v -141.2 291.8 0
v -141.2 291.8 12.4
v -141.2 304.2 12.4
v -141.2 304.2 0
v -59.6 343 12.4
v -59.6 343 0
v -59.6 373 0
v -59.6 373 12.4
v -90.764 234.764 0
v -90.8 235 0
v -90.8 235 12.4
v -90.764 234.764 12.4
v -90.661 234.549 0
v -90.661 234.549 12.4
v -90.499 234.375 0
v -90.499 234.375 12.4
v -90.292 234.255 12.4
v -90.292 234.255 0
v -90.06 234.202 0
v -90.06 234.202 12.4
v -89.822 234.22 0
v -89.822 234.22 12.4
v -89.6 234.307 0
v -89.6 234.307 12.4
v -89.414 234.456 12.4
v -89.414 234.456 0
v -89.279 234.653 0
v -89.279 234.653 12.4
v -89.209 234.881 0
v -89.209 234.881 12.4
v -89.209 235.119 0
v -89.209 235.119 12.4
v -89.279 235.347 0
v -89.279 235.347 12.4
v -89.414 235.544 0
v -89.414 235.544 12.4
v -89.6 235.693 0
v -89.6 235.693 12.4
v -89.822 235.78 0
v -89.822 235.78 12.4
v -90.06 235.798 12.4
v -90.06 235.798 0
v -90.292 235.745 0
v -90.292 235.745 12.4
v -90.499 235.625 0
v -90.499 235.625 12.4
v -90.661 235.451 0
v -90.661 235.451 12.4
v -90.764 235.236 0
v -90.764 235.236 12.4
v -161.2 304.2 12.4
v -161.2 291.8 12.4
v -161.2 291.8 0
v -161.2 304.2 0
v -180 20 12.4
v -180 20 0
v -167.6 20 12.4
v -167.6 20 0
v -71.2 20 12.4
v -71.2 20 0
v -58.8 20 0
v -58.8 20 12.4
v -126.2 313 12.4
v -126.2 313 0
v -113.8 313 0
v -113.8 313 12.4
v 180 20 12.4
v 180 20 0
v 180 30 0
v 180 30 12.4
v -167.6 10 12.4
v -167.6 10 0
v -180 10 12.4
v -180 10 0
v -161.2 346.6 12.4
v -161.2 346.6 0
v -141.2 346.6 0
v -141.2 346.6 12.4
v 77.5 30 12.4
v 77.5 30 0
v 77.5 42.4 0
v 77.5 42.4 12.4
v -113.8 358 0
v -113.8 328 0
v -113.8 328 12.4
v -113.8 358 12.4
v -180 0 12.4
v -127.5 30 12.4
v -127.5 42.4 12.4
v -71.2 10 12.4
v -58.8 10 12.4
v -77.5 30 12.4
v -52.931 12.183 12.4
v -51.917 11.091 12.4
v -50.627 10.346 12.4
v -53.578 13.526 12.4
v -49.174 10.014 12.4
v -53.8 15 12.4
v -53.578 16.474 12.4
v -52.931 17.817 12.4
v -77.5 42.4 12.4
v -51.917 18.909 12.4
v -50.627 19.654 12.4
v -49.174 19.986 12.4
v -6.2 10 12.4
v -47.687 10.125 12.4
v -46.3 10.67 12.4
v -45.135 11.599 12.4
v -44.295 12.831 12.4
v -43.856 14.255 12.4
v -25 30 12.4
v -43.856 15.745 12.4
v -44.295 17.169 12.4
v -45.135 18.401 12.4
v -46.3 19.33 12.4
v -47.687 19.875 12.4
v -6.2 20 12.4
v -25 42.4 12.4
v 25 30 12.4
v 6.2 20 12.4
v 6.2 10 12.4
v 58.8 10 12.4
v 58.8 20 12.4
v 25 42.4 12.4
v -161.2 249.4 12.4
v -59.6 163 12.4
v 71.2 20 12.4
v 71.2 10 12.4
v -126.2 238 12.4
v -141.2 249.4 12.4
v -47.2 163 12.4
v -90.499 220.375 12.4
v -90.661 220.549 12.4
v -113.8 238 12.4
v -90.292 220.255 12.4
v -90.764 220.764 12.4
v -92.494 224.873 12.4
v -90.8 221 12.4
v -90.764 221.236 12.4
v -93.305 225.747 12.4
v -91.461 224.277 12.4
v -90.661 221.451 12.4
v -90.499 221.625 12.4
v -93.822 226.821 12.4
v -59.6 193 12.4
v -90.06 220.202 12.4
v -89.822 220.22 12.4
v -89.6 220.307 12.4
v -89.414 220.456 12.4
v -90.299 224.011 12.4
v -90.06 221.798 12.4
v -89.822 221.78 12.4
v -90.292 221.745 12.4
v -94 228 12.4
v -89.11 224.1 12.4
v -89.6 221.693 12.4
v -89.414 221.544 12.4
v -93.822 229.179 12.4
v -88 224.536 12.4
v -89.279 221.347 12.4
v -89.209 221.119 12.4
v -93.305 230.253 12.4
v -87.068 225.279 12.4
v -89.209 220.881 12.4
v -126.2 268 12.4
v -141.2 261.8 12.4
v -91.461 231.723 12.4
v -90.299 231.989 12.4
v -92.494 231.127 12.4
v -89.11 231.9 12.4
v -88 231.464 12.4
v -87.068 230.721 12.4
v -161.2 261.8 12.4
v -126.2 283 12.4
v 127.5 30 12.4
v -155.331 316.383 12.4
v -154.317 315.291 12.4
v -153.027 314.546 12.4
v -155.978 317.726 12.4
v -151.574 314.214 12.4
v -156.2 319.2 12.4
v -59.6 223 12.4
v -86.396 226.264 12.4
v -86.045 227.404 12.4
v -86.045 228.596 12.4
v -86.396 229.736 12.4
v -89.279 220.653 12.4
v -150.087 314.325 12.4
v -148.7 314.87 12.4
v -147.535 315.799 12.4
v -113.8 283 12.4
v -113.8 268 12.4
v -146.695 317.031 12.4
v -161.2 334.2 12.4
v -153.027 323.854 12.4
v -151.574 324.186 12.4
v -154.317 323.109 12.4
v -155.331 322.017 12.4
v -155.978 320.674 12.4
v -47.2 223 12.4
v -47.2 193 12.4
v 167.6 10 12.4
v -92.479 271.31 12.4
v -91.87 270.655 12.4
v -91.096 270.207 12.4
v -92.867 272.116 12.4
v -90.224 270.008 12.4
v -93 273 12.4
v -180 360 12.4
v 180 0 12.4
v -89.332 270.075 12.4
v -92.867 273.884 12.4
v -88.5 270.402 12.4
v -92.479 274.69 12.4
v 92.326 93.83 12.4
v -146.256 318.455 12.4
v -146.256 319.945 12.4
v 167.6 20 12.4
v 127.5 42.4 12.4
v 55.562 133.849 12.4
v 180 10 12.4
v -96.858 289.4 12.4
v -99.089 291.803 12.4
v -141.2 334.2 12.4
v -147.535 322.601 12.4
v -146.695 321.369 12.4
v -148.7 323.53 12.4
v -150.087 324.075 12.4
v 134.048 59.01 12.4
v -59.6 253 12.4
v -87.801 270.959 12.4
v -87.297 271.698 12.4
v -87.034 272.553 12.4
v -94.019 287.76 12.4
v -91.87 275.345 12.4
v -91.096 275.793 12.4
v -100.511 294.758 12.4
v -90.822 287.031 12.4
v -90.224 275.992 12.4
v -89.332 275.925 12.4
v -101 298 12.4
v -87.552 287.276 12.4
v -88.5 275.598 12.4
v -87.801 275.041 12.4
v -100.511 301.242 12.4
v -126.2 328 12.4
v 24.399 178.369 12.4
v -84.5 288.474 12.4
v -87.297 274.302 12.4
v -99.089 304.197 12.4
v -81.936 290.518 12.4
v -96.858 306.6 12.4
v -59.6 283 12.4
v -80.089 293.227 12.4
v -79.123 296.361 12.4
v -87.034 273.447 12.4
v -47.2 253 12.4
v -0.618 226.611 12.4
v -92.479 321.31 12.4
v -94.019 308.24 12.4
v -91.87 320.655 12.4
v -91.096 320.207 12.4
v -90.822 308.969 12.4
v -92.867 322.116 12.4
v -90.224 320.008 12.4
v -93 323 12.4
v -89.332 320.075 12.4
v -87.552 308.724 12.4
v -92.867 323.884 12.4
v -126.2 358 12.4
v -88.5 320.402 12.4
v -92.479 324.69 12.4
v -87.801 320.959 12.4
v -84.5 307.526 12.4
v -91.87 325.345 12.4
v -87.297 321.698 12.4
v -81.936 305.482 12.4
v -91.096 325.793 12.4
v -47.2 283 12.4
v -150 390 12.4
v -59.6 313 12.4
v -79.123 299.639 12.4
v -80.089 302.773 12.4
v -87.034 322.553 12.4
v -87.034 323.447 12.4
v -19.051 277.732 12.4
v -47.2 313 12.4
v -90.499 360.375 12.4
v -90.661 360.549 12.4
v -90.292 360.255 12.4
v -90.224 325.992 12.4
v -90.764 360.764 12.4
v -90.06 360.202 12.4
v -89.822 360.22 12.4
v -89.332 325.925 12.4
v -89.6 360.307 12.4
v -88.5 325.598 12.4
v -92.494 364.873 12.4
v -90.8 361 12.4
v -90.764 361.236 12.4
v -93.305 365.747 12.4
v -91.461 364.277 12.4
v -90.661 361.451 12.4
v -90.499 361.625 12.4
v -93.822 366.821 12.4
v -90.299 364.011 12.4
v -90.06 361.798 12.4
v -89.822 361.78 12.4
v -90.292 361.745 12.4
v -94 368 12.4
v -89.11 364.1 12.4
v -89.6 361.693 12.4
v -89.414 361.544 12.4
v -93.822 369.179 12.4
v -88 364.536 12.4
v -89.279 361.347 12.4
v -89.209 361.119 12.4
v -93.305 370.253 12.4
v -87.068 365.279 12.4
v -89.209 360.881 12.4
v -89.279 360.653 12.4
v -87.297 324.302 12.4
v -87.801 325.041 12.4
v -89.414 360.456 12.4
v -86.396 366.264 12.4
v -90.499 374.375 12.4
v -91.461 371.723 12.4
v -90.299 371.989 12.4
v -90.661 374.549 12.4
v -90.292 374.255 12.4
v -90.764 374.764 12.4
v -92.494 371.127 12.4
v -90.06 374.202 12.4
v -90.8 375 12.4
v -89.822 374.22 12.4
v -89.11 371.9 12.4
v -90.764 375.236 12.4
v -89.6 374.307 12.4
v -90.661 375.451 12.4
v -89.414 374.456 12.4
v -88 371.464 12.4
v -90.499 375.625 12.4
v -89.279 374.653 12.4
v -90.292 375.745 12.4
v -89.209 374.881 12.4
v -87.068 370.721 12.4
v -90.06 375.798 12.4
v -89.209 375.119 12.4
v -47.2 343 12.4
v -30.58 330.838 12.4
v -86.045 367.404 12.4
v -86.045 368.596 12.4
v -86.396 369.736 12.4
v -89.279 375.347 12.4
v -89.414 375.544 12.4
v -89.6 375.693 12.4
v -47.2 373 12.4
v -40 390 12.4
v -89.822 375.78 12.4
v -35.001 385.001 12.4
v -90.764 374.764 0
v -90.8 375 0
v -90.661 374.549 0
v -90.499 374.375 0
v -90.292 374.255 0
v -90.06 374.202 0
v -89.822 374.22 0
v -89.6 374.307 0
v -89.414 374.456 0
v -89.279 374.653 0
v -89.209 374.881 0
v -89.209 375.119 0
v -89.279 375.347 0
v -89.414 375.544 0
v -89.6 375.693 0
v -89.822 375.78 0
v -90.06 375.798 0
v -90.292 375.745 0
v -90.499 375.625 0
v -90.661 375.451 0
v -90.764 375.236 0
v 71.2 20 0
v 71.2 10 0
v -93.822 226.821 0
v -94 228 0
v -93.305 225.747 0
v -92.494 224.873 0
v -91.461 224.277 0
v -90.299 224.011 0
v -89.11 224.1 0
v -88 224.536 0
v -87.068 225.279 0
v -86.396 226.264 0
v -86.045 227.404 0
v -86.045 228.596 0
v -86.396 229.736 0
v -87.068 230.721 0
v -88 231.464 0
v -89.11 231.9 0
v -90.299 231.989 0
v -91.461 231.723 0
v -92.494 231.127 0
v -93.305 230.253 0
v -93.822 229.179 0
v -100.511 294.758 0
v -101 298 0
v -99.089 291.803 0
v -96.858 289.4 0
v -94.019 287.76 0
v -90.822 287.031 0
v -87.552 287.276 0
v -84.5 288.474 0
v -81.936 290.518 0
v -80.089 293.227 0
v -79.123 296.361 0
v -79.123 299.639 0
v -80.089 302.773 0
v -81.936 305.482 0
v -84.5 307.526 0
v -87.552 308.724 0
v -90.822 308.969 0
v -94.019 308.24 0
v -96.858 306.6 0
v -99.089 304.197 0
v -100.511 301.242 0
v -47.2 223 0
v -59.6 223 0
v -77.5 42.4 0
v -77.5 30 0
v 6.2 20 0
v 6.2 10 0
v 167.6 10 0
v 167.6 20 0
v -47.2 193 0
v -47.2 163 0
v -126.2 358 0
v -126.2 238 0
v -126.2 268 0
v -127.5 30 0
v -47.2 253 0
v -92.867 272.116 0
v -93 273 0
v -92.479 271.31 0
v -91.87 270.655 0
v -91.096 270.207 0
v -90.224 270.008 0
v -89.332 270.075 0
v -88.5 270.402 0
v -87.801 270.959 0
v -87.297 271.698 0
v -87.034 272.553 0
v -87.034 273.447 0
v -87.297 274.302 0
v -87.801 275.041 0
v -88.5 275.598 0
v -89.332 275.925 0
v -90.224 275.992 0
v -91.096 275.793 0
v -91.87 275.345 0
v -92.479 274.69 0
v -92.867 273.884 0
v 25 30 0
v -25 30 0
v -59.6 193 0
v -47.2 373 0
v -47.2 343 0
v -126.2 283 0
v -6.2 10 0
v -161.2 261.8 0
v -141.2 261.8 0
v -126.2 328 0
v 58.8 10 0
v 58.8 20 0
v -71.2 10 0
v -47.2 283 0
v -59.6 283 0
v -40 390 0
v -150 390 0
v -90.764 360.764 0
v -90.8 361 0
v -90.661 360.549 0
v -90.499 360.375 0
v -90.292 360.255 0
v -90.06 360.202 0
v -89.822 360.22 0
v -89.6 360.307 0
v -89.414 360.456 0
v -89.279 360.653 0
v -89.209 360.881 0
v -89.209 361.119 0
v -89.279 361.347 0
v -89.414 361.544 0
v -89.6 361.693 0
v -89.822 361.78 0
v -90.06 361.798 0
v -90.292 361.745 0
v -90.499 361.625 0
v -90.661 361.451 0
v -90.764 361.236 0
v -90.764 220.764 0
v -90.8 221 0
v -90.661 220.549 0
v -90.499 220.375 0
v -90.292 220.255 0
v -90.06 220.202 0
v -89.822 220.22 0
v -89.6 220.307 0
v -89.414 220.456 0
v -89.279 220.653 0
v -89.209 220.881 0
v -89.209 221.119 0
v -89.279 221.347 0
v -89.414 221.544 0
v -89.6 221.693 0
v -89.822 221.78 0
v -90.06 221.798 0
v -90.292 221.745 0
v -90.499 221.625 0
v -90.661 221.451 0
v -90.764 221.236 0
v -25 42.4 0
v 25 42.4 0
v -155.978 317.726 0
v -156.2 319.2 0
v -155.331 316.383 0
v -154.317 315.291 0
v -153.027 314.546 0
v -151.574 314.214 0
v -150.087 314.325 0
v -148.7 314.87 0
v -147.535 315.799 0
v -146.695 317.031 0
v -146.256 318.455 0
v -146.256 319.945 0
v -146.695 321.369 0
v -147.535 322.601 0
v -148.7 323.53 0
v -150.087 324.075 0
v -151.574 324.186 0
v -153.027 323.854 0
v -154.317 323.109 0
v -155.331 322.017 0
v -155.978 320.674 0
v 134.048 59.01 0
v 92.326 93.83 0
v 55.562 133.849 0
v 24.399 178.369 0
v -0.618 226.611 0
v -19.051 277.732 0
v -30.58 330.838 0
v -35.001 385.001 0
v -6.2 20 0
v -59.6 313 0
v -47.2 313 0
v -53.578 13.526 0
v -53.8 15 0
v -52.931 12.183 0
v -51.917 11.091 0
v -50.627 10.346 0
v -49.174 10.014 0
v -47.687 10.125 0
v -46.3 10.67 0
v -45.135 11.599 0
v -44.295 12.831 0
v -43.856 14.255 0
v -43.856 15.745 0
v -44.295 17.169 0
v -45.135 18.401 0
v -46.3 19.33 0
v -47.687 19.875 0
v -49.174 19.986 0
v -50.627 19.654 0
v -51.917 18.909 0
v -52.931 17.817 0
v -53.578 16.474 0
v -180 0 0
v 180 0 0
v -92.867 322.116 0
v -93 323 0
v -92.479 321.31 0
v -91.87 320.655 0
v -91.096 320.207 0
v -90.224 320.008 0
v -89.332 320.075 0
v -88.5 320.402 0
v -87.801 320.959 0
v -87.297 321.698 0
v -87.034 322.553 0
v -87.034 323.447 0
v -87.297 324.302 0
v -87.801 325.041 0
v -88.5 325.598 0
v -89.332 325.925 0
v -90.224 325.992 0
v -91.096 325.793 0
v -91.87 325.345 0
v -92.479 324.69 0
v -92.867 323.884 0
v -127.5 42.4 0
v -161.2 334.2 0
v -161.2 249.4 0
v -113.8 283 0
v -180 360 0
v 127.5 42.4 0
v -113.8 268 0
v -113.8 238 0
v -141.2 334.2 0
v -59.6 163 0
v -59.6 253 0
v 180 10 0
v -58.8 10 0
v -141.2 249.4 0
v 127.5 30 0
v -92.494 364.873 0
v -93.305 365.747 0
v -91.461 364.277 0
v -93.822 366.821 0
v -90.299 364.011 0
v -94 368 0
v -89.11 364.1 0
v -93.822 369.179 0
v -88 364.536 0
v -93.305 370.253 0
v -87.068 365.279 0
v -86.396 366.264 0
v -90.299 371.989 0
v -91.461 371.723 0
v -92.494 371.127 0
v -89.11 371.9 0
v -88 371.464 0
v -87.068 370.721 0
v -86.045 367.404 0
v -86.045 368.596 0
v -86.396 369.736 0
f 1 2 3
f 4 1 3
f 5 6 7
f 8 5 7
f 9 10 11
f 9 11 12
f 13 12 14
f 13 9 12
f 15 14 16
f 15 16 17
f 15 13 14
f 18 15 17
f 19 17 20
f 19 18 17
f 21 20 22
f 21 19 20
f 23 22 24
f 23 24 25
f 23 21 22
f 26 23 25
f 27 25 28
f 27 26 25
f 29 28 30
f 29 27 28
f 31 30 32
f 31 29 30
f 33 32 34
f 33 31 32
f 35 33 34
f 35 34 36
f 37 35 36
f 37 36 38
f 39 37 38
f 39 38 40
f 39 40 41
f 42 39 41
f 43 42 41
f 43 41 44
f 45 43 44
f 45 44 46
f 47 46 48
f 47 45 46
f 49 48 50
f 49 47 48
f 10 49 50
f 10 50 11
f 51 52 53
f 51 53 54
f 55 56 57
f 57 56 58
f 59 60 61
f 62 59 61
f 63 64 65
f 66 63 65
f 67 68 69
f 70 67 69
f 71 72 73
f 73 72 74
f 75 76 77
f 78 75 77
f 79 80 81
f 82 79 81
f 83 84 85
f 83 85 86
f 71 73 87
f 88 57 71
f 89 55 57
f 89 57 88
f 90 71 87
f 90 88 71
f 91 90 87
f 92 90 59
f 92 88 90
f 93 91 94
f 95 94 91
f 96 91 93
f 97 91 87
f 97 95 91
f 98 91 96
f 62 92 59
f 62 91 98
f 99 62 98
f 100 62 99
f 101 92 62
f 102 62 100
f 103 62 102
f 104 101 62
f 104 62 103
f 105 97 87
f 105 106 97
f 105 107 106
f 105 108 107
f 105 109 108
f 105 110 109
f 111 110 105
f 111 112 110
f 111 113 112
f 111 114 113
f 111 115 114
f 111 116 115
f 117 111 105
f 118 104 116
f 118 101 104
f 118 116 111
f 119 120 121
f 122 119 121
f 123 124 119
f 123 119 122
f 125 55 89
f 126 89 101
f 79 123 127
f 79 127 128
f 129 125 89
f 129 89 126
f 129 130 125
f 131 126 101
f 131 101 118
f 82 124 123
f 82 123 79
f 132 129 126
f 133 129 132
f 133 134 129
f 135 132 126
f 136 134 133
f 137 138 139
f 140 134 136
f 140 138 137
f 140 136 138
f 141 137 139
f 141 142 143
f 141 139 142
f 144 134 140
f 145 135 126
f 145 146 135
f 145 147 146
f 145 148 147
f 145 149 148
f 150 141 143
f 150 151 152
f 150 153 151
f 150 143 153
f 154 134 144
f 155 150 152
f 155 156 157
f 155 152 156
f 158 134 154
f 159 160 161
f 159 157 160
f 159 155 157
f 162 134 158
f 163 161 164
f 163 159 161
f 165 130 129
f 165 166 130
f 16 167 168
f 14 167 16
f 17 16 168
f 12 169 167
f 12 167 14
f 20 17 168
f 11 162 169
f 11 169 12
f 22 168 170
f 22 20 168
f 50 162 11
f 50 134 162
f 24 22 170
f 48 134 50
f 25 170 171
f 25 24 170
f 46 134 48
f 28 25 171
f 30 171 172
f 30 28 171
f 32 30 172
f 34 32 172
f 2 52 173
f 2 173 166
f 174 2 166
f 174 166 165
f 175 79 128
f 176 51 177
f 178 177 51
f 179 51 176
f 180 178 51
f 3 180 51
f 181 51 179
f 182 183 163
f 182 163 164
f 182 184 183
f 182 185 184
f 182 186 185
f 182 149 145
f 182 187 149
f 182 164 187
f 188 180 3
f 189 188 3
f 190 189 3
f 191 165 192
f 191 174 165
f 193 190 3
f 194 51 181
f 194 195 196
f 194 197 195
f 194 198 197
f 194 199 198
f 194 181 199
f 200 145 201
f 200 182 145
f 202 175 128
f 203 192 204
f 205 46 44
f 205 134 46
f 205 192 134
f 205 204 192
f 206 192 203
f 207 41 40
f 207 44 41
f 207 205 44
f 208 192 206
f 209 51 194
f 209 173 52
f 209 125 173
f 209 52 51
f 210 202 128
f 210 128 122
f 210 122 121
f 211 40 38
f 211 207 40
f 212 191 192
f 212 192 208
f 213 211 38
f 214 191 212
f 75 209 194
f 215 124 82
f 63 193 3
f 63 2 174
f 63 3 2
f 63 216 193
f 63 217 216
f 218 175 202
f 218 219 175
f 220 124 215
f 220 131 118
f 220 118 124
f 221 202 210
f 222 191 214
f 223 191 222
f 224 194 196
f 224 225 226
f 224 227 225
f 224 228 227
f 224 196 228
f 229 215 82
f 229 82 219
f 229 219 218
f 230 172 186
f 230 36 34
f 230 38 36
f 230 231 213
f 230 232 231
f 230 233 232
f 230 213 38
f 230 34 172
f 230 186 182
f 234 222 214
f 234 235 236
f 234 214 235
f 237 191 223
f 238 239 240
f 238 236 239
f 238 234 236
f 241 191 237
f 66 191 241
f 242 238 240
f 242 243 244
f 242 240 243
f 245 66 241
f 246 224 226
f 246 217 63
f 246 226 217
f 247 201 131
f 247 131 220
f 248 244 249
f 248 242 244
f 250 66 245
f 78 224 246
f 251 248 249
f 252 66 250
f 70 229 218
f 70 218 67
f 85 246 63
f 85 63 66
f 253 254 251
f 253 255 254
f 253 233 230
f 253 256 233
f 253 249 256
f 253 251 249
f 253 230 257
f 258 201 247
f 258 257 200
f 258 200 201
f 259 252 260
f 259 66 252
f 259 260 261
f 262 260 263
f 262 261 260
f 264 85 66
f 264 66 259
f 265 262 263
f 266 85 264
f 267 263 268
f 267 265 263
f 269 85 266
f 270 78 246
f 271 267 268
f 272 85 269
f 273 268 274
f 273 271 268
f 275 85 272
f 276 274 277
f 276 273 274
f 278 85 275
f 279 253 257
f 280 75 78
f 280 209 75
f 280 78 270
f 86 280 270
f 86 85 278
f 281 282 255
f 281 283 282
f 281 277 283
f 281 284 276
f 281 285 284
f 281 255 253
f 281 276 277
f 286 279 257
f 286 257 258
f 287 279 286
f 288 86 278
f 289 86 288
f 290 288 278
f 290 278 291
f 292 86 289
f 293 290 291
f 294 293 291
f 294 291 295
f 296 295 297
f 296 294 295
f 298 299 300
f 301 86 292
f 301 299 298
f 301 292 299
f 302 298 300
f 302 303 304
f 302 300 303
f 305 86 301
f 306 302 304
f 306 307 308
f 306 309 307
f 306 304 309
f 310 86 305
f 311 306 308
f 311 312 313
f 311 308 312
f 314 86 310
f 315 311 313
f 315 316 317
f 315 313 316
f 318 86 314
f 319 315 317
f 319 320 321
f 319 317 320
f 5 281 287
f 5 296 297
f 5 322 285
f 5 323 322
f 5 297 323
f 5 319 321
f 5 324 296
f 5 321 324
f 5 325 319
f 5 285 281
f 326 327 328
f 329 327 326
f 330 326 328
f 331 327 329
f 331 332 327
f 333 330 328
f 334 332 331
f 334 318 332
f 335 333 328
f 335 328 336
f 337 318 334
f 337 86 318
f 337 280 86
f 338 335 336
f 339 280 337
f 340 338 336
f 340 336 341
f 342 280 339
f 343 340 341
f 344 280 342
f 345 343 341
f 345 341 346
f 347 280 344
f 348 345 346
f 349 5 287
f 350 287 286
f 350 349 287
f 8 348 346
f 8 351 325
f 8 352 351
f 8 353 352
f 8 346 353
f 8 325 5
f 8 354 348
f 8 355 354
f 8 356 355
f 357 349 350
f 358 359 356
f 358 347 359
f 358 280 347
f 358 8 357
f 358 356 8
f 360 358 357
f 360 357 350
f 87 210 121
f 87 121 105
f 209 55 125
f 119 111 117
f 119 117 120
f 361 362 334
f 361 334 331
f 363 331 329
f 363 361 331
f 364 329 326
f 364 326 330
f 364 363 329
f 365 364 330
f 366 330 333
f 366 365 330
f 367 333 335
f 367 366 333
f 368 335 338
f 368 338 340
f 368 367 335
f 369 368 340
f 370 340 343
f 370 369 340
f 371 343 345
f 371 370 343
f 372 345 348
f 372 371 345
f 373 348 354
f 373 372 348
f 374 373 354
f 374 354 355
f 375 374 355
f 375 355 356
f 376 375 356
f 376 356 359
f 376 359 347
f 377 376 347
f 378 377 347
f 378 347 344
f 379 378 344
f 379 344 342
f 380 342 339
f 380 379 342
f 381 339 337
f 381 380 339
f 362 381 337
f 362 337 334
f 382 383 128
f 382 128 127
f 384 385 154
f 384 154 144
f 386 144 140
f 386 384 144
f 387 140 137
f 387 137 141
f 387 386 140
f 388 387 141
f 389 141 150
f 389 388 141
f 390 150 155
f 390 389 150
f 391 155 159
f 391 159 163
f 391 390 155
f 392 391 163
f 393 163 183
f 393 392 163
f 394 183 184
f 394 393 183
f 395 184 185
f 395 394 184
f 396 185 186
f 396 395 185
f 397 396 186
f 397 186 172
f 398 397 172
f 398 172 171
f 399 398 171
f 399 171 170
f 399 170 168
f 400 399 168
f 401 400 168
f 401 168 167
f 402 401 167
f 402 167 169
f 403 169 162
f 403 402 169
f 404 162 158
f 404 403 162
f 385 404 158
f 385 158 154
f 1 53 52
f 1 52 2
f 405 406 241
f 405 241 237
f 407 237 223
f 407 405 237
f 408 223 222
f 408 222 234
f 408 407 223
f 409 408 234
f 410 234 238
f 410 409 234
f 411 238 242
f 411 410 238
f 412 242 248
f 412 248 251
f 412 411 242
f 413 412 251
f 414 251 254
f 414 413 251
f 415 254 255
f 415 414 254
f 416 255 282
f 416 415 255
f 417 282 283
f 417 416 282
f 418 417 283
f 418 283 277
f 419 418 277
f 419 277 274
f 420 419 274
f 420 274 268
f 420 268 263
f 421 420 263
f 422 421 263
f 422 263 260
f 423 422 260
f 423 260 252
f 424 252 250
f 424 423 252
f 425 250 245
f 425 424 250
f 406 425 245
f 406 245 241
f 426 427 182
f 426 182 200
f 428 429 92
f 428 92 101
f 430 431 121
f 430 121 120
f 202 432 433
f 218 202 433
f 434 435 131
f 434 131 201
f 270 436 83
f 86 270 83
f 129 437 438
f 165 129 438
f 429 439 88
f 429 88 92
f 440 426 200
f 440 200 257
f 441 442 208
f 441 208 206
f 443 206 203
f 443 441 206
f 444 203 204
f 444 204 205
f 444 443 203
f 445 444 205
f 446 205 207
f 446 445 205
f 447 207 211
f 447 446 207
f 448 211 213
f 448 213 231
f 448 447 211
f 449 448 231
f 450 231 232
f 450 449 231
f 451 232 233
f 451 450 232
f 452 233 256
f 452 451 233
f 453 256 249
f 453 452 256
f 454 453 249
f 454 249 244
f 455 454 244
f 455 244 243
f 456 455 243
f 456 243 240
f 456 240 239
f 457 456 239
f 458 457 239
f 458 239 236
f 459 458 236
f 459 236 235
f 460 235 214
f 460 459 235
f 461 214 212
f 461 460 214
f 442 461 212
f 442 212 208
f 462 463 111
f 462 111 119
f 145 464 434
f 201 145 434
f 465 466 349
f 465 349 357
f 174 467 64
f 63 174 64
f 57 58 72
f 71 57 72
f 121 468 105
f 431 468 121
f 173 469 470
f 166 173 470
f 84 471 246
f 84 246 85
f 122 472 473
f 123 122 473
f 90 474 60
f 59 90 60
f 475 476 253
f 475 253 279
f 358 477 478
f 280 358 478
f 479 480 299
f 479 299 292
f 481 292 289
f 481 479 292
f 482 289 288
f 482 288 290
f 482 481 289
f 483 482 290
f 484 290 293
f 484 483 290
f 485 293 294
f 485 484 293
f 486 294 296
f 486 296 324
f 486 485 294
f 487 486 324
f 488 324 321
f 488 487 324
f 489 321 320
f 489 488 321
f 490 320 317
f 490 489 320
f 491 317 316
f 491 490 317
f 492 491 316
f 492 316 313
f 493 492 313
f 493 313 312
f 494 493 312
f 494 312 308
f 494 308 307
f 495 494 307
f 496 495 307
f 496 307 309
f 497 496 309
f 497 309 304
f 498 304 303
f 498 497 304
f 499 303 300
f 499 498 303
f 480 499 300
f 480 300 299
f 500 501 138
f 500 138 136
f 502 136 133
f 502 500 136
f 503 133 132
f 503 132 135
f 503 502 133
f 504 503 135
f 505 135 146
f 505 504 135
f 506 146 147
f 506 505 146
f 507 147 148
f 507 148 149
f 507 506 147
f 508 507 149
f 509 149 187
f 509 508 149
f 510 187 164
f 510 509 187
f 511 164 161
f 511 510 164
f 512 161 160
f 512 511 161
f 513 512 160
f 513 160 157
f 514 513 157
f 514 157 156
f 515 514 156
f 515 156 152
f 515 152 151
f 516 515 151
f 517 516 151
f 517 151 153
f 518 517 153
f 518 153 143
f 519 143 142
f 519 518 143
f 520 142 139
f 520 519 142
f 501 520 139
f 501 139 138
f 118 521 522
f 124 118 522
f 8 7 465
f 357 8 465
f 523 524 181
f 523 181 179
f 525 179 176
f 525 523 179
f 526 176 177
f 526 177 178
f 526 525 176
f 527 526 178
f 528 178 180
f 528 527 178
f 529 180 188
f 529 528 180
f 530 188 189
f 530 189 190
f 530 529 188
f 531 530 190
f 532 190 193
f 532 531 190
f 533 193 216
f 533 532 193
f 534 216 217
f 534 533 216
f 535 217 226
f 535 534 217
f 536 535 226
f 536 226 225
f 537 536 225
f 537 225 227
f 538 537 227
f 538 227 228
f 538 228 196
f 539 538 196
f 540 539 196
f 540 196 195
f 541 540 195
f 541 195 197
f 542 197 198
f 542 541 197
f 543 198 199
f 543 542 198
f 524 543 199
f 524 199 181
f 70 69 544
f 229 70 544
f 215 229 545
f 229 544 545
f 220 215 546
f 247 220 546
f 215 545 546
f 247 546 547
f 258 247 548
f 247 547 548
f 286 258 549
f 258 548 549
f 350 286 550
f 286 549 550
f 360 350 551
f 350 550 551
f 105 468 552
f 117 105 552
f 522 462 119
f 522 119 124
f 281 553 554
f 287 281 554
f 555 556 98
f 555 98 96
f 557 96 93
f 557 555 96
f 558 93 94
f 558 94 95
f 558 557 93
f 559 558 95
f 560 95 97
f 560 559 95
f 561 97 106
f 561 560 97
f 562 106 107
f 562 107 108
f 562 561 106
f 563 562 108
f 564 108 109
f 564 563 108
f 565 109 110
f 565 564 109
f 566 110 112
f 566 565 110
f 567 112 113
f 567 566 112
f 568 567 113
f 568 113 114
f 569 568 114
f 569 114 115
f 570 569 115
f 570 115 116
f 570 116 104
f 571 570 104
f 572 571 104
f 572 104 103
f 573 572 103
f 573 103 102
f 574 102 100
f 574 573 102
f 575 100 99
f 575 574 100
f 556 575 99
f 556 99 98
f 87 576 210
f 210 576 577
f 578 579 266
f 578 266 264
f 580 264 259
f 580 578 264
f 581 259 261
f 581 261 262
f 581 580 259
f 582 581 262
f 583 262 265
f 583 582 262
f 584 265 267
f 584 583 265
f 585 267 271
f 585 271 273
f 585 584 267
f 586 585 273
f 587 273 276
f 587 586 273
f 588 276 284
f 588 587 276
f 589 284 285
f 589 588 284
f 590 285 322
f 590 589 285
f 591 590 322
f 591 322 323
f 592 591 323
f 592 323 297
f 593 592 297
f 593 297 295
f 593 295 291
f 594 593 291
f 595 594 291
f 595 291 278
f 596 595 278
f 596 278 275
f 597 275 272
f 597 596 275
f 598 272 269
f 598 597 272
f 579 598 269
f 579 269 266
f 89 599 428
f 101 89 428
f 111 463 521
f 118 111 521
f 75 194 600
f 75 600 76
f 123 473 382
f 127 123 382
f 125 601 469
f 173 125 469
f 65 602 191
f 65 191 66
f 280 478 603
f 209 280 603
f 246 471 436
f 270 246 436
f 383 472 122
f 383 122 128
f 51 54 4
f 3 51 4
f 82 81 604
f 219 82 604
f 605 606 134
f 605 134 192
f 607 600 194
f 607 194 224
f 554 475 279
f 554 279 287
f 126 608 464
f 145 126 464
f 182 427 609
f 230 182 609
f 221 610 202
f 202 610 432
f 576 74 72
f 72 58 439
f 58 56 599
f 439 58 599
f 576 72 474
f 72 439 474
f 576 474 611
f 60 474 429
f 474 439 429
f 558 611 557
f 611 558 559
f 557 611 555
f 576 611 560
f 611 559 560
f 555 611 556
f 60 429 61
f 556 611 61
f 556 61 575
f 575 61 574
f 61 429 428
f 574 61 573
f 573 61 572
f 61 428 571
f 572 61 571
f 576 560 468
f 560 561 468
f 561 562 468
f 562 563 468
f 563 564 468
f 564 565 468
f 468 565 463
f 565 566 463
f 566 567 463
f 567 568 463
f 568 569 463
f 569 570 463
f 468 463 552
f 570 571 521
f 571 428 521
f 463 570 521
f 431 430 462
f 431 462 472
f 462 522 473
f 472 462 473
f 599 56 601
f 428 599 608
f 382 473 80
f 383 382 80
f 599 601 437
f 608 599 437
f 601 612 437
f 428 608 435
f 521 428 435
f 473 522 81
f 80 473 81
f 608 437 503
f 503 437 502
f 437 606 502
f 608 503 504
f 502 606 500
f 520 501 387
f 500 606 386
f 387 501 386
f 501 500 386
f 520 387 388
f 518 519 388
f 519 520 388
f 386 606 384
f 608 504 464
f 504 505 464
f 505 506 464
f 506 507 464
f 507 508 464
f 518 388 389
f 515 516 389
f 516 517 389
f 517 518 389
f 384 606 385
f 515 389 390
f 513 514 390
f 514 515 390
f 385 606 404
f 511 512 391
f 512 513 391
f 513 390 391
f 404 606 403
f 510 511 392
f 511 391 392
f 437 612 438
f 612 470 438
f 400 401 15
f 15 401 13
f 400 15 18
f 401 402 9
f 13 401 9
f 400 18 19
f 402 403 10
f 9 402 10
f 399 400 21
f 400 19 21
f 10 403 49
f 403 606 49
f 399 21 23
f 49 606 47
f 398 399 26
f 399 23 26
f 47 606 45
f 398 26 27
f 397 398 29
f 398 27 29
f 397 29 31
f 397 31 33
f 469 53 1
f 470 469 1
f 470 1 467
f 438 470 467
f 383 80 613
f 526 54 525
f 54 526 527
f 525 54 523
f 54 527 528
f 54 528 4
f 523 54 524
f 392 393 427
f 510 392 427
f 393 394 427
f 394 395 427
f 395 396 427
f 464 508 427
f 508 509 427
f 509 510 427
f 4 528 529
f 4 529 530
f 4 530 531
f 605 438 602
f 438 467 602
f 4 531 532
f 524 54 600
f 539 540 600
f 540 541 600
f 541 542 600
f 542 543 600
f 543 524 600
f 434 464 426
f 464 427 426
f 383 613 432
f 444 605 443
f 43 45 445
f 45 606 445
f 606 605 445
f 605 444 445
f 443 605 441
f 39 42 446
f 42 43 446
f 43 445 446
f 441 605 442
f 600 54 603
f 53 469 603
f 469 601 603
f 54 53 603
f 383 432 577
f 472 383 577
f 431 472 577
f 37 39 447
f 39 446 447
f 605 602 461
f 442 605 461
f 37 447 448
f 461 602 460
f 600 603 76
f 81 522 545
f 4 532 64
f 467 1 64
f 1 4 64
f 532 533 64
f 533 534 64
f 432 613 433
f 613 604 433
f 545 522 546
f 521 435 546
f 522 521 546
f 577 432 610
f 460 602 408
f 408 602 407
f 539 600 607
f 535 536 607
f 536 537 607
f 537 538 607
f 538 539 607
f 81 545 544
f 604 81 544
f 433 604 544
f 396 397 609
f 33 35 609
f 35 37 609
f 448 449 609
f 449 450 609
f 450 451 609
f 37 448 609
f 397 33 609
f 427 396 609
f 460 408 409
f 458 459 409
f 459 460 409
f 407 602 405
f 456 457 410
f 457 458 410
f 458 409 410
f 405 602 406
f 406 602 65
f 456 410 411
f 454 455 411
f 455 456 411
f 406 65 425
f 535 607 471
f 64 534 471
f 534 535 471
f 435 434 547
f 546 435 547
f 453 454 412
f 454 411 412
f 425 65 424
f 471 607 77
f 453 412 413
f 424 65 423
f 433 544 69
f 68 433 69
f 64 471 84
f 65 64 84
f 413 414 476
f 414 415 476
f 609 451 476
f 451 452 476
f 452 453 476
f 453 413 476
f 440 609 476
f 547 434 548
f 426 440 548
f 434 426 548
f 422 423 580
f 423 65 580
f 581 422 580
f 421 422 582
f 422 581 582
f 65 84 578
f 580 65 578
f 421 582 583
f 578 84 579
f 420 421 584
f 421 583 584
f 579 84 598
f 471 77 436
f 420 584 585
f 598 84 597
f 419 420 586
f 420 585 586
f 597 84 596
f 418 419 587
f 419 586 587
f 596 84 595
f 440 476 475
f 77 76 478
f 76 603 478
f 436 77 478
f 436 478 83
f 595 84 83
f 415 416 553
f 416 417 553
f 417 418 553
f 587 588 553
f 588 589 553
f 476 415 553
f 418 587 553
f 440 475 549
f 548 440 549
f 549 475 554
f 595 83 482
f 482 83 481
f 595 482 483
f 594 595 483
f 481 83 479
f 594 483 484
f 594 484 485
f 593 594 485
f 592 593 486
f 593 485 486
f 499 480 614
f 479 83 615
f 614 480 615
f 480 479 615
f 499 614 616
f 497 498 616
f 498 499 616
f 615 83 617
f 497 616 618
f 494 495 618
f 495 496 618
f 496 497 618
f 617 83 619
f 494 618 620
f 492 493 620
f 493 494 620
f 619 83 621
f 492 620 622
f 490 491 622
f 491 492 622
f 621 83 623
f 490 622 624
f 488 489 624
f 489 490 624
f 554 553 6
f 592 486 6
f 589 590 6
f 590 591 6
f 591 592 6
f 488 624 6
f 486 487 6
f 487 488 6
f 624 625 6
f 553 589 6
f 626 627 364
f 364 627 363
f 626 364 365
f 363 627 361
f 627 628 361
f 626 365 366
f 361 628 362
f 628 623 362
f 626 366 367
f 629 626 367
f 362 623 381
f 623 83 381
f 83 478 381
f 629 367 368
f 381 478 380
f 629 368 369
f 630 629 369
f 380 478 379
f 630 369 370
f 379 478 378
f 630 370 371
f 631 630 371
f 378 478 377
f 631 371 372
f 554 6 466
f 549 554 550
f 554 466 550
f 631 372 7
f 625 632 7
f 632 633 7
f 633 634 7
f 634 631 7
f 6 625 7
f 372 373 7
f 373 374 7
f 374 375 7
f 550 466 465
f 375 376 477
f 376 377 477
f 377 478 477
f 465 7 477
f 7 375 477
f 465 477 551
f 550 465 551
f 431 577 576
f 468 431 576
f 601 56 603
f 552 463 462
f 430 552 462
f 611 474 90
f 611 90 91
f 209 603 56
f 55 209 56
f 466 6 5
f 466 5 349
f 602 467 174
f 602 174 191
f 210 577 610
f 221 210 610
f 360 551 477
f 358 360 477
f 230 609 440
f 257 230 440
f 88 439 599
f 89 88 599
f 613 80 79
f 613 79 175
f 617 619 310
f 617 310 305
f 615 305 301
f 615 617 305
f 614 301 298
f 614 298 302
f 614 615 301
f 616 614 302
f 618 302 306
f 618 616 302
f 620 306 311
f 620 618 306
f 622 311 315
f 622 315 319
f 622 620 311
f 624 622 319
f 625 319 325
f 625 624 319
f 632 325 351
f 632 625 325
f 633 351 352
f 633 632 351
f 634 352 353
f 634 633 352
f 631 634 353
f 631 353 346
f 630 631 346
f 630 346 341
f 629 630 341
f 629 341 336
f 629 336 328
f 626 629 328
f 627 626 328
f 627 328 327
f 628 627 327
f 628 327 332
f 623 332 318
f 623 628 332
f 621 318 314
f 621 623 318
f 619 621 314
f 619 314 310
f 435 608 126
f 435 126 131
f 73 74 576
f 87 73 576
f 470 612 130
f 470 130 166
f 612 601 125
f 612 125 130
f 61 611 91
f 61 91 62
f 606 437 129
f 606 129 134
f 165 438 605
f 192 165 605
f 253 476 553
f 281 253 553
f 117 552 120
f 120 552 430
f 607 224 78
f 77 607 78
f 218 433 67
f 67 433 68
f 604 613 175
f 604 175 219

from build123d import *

# Parameters (mm, degrees)
SKETCH1_R           = 5
SKETCH1_R_2         = 11
SKETCH1_R_3         = 3
SKETCH1_R_4         = 4
SKETCH1_R_5         = 0.8
SKETCH1_W           = 12.4
SKETCH1_H           = 10
SKETCH1_W_2         = 50
SKETCH1_H_2         = 12.4
SKETCH1_H_3         = 30
SKETCH1_W_3         = 20
BOSS_EXTRUDE1_DEPTH = 12.4


with BuildPart() as part:
    # Sketch1 → Boss-Extrude1 (new body)
    with BuildSketch(Plane.XY):
        with BuildLine():
            Line((-180, 0), (180, 0))
            Line((180, 0), (180, 10))
            Line((180, 10), (167.6, 10))
            Line((167.6, 10), (167.6, 20))
            Line((167.6, 20), (180, 20))
            Line((180, 20), (180, 30))
            ThreePointArc((180, 30), (24.399116368, 178.368906186), (-35.000570148, 385.000570148))
            Line((-35.000570148, 385.000570148), (-40, 390))
            Line((-40, 390), (-140, 390))
            Line((-140, 390), (-150, 390))
            Line((-150, 390), (-180, 360))
            Line((-180, 360), (-180, 30))
            Line((-180, 30), (-180, 20))
            Line((-180, 20), (-167.6, 20))
            Line((-167.6, 20), (-167.6, 10))
            Line((-167.6, 10), (-180, 10))
            Line((-180, 10), (-180, 0))
        make_face()
        with Locations(Location((-151.2, 319.2, 0), (0, 0, 180))):
            Circle(SKETCH1_R, mode=Mode.SUBTRACT)
        with Locations(Location((-90, 298, 0), (0, 0, 180))):
            Circle(SKETCH1_R_2, mode=Mode.SUBTRACT)
        with Locations(Location((-90, 323, 0), (0, 0, 180))):
            Circle(SKETCH1_R_3, mode=Mode.SUBTRACT)
        with Locations(Location((-90, 368, 0), (0, 0, 180))):
            Circle(SKETCH1_R_4, mode=Mode.SUBTRACT)
        with Locations(Location((-90, 375, 0), (0, 0, 180))):
            Circle(SKETCH1_R_5, mode=Mode.SUBTRACT)
        with Locations(Location((-90, 361, 0), (0, 0, 180))):
            Circle(SKETCH1_R_5, mode=Mode.SUBTRACT)
        with Locations(Location((-90, 221, 0), (0, 0, 180))):
            Circle(SKETCH1_R_5, mode=Mode.SUBTRACT)
        with Locations(Location((-90, 228, 0), (0, 0, 180))):
            Circle(SKETCH1_R_4, mode=Mode.SUBTRACT)
        with Locations(Location((-90, 235, 0), (0, 0, 180))):
            Circle(SKETCH1_R_5, mode=Mode.SUBTRACT)
        with Locations(Location((-90, 273, 0), (0, 0, 180))):
            Circle(SKETCH1_R_3, mode=Mode.SUBTRACT)
        with Locations(Location((-48.8, 15, 0), (0, 0, 180))):
            Circle(SKETCH1_R, mode=Mode.SUBTRACT)
        with Locations((65, 15)):
            Rectangle(SKETCH1_W, SKETCH1_H, mode=Mode.SUBTRACT)
        with Locations((0, 15)):
            Rectangle(SKETCH1_W, SKETCH1_H, mode=Mode.SUBTRACT)
        with Locations((-65, 15)):
            Rectangle(SKETCH1_W, SKETCH1_H, mode=Mode.SUBTRACT)
        with Locations((102.5, 36.2)):
            Rectangle(SKETCH1_W_2, SKETCH1_H_2, mode=Mode.SUBTRACT)
        with Locations((0, 36.2)):
            Rectangle(SKETCH1_W_2, SKETCH1_H_2, mode=Mode.SUBTRACT)
        with Locations((-102.5, 36.2)):
            Rectangle(SKETCH1_W_2, SKETCH1_H_2, mode=Mode.SUBTRACT)
        with Locations((-120, 298)):
            Rectangle(SKETCH1_W, SKETCH1_H_3, mode=Mode.SUBTRACT)
        with Locations((-120, 343)):
            Rectangle(SKETCH1_W, SKETCH1_H_3, mode=Mode.SUBTRACT)
        with Locations((-120, 253)):
            Rectangle(SKETCH1_W, SKETCH1_H_3, mode=Mode.SUBTRACT)
        with Locations((-151.2, 340.4)):
            Rectangle(SKETCH1_W_3, SKETCH1_H_2, mode=Mode.SUBTRACT)
        with Locations((-151.2, 298)):
            Rectangle(SKETCH1_W_3, SKETCH1_H_2, mode=Mode.SUBTRACT)
        with Locations((-151.2, 255.6)):
            Rectangle(SKETCH1_W_3, SKETCH1_H_2, mode=Mode.SUBTRACT)
        with Locations((-53.4, 358)):
            Rectangle(SKETCH1_W, SKETCH1_H_3, mode=Mode.SUBTRACT)
        with Locations((-53.4, 298)):
            Rectangle(SKETCH1_W, SKETCH1_H_3, mode=Mode.SUBTRACT)
        with Locations((-53.4, 238)):
            Rectangle(SKETCH1_W, SKETCH1_H_3, mode=Mode.SUBTRACT)
        with Locations((-53.4, 178)):
            Rectangle(SKETCH1_W, SKETCH1_H_3, mode=Mode.SUBTRACT)
    extrude(amount=BOSS_EXTRUDE1_DEPTH)


solid = part.part
